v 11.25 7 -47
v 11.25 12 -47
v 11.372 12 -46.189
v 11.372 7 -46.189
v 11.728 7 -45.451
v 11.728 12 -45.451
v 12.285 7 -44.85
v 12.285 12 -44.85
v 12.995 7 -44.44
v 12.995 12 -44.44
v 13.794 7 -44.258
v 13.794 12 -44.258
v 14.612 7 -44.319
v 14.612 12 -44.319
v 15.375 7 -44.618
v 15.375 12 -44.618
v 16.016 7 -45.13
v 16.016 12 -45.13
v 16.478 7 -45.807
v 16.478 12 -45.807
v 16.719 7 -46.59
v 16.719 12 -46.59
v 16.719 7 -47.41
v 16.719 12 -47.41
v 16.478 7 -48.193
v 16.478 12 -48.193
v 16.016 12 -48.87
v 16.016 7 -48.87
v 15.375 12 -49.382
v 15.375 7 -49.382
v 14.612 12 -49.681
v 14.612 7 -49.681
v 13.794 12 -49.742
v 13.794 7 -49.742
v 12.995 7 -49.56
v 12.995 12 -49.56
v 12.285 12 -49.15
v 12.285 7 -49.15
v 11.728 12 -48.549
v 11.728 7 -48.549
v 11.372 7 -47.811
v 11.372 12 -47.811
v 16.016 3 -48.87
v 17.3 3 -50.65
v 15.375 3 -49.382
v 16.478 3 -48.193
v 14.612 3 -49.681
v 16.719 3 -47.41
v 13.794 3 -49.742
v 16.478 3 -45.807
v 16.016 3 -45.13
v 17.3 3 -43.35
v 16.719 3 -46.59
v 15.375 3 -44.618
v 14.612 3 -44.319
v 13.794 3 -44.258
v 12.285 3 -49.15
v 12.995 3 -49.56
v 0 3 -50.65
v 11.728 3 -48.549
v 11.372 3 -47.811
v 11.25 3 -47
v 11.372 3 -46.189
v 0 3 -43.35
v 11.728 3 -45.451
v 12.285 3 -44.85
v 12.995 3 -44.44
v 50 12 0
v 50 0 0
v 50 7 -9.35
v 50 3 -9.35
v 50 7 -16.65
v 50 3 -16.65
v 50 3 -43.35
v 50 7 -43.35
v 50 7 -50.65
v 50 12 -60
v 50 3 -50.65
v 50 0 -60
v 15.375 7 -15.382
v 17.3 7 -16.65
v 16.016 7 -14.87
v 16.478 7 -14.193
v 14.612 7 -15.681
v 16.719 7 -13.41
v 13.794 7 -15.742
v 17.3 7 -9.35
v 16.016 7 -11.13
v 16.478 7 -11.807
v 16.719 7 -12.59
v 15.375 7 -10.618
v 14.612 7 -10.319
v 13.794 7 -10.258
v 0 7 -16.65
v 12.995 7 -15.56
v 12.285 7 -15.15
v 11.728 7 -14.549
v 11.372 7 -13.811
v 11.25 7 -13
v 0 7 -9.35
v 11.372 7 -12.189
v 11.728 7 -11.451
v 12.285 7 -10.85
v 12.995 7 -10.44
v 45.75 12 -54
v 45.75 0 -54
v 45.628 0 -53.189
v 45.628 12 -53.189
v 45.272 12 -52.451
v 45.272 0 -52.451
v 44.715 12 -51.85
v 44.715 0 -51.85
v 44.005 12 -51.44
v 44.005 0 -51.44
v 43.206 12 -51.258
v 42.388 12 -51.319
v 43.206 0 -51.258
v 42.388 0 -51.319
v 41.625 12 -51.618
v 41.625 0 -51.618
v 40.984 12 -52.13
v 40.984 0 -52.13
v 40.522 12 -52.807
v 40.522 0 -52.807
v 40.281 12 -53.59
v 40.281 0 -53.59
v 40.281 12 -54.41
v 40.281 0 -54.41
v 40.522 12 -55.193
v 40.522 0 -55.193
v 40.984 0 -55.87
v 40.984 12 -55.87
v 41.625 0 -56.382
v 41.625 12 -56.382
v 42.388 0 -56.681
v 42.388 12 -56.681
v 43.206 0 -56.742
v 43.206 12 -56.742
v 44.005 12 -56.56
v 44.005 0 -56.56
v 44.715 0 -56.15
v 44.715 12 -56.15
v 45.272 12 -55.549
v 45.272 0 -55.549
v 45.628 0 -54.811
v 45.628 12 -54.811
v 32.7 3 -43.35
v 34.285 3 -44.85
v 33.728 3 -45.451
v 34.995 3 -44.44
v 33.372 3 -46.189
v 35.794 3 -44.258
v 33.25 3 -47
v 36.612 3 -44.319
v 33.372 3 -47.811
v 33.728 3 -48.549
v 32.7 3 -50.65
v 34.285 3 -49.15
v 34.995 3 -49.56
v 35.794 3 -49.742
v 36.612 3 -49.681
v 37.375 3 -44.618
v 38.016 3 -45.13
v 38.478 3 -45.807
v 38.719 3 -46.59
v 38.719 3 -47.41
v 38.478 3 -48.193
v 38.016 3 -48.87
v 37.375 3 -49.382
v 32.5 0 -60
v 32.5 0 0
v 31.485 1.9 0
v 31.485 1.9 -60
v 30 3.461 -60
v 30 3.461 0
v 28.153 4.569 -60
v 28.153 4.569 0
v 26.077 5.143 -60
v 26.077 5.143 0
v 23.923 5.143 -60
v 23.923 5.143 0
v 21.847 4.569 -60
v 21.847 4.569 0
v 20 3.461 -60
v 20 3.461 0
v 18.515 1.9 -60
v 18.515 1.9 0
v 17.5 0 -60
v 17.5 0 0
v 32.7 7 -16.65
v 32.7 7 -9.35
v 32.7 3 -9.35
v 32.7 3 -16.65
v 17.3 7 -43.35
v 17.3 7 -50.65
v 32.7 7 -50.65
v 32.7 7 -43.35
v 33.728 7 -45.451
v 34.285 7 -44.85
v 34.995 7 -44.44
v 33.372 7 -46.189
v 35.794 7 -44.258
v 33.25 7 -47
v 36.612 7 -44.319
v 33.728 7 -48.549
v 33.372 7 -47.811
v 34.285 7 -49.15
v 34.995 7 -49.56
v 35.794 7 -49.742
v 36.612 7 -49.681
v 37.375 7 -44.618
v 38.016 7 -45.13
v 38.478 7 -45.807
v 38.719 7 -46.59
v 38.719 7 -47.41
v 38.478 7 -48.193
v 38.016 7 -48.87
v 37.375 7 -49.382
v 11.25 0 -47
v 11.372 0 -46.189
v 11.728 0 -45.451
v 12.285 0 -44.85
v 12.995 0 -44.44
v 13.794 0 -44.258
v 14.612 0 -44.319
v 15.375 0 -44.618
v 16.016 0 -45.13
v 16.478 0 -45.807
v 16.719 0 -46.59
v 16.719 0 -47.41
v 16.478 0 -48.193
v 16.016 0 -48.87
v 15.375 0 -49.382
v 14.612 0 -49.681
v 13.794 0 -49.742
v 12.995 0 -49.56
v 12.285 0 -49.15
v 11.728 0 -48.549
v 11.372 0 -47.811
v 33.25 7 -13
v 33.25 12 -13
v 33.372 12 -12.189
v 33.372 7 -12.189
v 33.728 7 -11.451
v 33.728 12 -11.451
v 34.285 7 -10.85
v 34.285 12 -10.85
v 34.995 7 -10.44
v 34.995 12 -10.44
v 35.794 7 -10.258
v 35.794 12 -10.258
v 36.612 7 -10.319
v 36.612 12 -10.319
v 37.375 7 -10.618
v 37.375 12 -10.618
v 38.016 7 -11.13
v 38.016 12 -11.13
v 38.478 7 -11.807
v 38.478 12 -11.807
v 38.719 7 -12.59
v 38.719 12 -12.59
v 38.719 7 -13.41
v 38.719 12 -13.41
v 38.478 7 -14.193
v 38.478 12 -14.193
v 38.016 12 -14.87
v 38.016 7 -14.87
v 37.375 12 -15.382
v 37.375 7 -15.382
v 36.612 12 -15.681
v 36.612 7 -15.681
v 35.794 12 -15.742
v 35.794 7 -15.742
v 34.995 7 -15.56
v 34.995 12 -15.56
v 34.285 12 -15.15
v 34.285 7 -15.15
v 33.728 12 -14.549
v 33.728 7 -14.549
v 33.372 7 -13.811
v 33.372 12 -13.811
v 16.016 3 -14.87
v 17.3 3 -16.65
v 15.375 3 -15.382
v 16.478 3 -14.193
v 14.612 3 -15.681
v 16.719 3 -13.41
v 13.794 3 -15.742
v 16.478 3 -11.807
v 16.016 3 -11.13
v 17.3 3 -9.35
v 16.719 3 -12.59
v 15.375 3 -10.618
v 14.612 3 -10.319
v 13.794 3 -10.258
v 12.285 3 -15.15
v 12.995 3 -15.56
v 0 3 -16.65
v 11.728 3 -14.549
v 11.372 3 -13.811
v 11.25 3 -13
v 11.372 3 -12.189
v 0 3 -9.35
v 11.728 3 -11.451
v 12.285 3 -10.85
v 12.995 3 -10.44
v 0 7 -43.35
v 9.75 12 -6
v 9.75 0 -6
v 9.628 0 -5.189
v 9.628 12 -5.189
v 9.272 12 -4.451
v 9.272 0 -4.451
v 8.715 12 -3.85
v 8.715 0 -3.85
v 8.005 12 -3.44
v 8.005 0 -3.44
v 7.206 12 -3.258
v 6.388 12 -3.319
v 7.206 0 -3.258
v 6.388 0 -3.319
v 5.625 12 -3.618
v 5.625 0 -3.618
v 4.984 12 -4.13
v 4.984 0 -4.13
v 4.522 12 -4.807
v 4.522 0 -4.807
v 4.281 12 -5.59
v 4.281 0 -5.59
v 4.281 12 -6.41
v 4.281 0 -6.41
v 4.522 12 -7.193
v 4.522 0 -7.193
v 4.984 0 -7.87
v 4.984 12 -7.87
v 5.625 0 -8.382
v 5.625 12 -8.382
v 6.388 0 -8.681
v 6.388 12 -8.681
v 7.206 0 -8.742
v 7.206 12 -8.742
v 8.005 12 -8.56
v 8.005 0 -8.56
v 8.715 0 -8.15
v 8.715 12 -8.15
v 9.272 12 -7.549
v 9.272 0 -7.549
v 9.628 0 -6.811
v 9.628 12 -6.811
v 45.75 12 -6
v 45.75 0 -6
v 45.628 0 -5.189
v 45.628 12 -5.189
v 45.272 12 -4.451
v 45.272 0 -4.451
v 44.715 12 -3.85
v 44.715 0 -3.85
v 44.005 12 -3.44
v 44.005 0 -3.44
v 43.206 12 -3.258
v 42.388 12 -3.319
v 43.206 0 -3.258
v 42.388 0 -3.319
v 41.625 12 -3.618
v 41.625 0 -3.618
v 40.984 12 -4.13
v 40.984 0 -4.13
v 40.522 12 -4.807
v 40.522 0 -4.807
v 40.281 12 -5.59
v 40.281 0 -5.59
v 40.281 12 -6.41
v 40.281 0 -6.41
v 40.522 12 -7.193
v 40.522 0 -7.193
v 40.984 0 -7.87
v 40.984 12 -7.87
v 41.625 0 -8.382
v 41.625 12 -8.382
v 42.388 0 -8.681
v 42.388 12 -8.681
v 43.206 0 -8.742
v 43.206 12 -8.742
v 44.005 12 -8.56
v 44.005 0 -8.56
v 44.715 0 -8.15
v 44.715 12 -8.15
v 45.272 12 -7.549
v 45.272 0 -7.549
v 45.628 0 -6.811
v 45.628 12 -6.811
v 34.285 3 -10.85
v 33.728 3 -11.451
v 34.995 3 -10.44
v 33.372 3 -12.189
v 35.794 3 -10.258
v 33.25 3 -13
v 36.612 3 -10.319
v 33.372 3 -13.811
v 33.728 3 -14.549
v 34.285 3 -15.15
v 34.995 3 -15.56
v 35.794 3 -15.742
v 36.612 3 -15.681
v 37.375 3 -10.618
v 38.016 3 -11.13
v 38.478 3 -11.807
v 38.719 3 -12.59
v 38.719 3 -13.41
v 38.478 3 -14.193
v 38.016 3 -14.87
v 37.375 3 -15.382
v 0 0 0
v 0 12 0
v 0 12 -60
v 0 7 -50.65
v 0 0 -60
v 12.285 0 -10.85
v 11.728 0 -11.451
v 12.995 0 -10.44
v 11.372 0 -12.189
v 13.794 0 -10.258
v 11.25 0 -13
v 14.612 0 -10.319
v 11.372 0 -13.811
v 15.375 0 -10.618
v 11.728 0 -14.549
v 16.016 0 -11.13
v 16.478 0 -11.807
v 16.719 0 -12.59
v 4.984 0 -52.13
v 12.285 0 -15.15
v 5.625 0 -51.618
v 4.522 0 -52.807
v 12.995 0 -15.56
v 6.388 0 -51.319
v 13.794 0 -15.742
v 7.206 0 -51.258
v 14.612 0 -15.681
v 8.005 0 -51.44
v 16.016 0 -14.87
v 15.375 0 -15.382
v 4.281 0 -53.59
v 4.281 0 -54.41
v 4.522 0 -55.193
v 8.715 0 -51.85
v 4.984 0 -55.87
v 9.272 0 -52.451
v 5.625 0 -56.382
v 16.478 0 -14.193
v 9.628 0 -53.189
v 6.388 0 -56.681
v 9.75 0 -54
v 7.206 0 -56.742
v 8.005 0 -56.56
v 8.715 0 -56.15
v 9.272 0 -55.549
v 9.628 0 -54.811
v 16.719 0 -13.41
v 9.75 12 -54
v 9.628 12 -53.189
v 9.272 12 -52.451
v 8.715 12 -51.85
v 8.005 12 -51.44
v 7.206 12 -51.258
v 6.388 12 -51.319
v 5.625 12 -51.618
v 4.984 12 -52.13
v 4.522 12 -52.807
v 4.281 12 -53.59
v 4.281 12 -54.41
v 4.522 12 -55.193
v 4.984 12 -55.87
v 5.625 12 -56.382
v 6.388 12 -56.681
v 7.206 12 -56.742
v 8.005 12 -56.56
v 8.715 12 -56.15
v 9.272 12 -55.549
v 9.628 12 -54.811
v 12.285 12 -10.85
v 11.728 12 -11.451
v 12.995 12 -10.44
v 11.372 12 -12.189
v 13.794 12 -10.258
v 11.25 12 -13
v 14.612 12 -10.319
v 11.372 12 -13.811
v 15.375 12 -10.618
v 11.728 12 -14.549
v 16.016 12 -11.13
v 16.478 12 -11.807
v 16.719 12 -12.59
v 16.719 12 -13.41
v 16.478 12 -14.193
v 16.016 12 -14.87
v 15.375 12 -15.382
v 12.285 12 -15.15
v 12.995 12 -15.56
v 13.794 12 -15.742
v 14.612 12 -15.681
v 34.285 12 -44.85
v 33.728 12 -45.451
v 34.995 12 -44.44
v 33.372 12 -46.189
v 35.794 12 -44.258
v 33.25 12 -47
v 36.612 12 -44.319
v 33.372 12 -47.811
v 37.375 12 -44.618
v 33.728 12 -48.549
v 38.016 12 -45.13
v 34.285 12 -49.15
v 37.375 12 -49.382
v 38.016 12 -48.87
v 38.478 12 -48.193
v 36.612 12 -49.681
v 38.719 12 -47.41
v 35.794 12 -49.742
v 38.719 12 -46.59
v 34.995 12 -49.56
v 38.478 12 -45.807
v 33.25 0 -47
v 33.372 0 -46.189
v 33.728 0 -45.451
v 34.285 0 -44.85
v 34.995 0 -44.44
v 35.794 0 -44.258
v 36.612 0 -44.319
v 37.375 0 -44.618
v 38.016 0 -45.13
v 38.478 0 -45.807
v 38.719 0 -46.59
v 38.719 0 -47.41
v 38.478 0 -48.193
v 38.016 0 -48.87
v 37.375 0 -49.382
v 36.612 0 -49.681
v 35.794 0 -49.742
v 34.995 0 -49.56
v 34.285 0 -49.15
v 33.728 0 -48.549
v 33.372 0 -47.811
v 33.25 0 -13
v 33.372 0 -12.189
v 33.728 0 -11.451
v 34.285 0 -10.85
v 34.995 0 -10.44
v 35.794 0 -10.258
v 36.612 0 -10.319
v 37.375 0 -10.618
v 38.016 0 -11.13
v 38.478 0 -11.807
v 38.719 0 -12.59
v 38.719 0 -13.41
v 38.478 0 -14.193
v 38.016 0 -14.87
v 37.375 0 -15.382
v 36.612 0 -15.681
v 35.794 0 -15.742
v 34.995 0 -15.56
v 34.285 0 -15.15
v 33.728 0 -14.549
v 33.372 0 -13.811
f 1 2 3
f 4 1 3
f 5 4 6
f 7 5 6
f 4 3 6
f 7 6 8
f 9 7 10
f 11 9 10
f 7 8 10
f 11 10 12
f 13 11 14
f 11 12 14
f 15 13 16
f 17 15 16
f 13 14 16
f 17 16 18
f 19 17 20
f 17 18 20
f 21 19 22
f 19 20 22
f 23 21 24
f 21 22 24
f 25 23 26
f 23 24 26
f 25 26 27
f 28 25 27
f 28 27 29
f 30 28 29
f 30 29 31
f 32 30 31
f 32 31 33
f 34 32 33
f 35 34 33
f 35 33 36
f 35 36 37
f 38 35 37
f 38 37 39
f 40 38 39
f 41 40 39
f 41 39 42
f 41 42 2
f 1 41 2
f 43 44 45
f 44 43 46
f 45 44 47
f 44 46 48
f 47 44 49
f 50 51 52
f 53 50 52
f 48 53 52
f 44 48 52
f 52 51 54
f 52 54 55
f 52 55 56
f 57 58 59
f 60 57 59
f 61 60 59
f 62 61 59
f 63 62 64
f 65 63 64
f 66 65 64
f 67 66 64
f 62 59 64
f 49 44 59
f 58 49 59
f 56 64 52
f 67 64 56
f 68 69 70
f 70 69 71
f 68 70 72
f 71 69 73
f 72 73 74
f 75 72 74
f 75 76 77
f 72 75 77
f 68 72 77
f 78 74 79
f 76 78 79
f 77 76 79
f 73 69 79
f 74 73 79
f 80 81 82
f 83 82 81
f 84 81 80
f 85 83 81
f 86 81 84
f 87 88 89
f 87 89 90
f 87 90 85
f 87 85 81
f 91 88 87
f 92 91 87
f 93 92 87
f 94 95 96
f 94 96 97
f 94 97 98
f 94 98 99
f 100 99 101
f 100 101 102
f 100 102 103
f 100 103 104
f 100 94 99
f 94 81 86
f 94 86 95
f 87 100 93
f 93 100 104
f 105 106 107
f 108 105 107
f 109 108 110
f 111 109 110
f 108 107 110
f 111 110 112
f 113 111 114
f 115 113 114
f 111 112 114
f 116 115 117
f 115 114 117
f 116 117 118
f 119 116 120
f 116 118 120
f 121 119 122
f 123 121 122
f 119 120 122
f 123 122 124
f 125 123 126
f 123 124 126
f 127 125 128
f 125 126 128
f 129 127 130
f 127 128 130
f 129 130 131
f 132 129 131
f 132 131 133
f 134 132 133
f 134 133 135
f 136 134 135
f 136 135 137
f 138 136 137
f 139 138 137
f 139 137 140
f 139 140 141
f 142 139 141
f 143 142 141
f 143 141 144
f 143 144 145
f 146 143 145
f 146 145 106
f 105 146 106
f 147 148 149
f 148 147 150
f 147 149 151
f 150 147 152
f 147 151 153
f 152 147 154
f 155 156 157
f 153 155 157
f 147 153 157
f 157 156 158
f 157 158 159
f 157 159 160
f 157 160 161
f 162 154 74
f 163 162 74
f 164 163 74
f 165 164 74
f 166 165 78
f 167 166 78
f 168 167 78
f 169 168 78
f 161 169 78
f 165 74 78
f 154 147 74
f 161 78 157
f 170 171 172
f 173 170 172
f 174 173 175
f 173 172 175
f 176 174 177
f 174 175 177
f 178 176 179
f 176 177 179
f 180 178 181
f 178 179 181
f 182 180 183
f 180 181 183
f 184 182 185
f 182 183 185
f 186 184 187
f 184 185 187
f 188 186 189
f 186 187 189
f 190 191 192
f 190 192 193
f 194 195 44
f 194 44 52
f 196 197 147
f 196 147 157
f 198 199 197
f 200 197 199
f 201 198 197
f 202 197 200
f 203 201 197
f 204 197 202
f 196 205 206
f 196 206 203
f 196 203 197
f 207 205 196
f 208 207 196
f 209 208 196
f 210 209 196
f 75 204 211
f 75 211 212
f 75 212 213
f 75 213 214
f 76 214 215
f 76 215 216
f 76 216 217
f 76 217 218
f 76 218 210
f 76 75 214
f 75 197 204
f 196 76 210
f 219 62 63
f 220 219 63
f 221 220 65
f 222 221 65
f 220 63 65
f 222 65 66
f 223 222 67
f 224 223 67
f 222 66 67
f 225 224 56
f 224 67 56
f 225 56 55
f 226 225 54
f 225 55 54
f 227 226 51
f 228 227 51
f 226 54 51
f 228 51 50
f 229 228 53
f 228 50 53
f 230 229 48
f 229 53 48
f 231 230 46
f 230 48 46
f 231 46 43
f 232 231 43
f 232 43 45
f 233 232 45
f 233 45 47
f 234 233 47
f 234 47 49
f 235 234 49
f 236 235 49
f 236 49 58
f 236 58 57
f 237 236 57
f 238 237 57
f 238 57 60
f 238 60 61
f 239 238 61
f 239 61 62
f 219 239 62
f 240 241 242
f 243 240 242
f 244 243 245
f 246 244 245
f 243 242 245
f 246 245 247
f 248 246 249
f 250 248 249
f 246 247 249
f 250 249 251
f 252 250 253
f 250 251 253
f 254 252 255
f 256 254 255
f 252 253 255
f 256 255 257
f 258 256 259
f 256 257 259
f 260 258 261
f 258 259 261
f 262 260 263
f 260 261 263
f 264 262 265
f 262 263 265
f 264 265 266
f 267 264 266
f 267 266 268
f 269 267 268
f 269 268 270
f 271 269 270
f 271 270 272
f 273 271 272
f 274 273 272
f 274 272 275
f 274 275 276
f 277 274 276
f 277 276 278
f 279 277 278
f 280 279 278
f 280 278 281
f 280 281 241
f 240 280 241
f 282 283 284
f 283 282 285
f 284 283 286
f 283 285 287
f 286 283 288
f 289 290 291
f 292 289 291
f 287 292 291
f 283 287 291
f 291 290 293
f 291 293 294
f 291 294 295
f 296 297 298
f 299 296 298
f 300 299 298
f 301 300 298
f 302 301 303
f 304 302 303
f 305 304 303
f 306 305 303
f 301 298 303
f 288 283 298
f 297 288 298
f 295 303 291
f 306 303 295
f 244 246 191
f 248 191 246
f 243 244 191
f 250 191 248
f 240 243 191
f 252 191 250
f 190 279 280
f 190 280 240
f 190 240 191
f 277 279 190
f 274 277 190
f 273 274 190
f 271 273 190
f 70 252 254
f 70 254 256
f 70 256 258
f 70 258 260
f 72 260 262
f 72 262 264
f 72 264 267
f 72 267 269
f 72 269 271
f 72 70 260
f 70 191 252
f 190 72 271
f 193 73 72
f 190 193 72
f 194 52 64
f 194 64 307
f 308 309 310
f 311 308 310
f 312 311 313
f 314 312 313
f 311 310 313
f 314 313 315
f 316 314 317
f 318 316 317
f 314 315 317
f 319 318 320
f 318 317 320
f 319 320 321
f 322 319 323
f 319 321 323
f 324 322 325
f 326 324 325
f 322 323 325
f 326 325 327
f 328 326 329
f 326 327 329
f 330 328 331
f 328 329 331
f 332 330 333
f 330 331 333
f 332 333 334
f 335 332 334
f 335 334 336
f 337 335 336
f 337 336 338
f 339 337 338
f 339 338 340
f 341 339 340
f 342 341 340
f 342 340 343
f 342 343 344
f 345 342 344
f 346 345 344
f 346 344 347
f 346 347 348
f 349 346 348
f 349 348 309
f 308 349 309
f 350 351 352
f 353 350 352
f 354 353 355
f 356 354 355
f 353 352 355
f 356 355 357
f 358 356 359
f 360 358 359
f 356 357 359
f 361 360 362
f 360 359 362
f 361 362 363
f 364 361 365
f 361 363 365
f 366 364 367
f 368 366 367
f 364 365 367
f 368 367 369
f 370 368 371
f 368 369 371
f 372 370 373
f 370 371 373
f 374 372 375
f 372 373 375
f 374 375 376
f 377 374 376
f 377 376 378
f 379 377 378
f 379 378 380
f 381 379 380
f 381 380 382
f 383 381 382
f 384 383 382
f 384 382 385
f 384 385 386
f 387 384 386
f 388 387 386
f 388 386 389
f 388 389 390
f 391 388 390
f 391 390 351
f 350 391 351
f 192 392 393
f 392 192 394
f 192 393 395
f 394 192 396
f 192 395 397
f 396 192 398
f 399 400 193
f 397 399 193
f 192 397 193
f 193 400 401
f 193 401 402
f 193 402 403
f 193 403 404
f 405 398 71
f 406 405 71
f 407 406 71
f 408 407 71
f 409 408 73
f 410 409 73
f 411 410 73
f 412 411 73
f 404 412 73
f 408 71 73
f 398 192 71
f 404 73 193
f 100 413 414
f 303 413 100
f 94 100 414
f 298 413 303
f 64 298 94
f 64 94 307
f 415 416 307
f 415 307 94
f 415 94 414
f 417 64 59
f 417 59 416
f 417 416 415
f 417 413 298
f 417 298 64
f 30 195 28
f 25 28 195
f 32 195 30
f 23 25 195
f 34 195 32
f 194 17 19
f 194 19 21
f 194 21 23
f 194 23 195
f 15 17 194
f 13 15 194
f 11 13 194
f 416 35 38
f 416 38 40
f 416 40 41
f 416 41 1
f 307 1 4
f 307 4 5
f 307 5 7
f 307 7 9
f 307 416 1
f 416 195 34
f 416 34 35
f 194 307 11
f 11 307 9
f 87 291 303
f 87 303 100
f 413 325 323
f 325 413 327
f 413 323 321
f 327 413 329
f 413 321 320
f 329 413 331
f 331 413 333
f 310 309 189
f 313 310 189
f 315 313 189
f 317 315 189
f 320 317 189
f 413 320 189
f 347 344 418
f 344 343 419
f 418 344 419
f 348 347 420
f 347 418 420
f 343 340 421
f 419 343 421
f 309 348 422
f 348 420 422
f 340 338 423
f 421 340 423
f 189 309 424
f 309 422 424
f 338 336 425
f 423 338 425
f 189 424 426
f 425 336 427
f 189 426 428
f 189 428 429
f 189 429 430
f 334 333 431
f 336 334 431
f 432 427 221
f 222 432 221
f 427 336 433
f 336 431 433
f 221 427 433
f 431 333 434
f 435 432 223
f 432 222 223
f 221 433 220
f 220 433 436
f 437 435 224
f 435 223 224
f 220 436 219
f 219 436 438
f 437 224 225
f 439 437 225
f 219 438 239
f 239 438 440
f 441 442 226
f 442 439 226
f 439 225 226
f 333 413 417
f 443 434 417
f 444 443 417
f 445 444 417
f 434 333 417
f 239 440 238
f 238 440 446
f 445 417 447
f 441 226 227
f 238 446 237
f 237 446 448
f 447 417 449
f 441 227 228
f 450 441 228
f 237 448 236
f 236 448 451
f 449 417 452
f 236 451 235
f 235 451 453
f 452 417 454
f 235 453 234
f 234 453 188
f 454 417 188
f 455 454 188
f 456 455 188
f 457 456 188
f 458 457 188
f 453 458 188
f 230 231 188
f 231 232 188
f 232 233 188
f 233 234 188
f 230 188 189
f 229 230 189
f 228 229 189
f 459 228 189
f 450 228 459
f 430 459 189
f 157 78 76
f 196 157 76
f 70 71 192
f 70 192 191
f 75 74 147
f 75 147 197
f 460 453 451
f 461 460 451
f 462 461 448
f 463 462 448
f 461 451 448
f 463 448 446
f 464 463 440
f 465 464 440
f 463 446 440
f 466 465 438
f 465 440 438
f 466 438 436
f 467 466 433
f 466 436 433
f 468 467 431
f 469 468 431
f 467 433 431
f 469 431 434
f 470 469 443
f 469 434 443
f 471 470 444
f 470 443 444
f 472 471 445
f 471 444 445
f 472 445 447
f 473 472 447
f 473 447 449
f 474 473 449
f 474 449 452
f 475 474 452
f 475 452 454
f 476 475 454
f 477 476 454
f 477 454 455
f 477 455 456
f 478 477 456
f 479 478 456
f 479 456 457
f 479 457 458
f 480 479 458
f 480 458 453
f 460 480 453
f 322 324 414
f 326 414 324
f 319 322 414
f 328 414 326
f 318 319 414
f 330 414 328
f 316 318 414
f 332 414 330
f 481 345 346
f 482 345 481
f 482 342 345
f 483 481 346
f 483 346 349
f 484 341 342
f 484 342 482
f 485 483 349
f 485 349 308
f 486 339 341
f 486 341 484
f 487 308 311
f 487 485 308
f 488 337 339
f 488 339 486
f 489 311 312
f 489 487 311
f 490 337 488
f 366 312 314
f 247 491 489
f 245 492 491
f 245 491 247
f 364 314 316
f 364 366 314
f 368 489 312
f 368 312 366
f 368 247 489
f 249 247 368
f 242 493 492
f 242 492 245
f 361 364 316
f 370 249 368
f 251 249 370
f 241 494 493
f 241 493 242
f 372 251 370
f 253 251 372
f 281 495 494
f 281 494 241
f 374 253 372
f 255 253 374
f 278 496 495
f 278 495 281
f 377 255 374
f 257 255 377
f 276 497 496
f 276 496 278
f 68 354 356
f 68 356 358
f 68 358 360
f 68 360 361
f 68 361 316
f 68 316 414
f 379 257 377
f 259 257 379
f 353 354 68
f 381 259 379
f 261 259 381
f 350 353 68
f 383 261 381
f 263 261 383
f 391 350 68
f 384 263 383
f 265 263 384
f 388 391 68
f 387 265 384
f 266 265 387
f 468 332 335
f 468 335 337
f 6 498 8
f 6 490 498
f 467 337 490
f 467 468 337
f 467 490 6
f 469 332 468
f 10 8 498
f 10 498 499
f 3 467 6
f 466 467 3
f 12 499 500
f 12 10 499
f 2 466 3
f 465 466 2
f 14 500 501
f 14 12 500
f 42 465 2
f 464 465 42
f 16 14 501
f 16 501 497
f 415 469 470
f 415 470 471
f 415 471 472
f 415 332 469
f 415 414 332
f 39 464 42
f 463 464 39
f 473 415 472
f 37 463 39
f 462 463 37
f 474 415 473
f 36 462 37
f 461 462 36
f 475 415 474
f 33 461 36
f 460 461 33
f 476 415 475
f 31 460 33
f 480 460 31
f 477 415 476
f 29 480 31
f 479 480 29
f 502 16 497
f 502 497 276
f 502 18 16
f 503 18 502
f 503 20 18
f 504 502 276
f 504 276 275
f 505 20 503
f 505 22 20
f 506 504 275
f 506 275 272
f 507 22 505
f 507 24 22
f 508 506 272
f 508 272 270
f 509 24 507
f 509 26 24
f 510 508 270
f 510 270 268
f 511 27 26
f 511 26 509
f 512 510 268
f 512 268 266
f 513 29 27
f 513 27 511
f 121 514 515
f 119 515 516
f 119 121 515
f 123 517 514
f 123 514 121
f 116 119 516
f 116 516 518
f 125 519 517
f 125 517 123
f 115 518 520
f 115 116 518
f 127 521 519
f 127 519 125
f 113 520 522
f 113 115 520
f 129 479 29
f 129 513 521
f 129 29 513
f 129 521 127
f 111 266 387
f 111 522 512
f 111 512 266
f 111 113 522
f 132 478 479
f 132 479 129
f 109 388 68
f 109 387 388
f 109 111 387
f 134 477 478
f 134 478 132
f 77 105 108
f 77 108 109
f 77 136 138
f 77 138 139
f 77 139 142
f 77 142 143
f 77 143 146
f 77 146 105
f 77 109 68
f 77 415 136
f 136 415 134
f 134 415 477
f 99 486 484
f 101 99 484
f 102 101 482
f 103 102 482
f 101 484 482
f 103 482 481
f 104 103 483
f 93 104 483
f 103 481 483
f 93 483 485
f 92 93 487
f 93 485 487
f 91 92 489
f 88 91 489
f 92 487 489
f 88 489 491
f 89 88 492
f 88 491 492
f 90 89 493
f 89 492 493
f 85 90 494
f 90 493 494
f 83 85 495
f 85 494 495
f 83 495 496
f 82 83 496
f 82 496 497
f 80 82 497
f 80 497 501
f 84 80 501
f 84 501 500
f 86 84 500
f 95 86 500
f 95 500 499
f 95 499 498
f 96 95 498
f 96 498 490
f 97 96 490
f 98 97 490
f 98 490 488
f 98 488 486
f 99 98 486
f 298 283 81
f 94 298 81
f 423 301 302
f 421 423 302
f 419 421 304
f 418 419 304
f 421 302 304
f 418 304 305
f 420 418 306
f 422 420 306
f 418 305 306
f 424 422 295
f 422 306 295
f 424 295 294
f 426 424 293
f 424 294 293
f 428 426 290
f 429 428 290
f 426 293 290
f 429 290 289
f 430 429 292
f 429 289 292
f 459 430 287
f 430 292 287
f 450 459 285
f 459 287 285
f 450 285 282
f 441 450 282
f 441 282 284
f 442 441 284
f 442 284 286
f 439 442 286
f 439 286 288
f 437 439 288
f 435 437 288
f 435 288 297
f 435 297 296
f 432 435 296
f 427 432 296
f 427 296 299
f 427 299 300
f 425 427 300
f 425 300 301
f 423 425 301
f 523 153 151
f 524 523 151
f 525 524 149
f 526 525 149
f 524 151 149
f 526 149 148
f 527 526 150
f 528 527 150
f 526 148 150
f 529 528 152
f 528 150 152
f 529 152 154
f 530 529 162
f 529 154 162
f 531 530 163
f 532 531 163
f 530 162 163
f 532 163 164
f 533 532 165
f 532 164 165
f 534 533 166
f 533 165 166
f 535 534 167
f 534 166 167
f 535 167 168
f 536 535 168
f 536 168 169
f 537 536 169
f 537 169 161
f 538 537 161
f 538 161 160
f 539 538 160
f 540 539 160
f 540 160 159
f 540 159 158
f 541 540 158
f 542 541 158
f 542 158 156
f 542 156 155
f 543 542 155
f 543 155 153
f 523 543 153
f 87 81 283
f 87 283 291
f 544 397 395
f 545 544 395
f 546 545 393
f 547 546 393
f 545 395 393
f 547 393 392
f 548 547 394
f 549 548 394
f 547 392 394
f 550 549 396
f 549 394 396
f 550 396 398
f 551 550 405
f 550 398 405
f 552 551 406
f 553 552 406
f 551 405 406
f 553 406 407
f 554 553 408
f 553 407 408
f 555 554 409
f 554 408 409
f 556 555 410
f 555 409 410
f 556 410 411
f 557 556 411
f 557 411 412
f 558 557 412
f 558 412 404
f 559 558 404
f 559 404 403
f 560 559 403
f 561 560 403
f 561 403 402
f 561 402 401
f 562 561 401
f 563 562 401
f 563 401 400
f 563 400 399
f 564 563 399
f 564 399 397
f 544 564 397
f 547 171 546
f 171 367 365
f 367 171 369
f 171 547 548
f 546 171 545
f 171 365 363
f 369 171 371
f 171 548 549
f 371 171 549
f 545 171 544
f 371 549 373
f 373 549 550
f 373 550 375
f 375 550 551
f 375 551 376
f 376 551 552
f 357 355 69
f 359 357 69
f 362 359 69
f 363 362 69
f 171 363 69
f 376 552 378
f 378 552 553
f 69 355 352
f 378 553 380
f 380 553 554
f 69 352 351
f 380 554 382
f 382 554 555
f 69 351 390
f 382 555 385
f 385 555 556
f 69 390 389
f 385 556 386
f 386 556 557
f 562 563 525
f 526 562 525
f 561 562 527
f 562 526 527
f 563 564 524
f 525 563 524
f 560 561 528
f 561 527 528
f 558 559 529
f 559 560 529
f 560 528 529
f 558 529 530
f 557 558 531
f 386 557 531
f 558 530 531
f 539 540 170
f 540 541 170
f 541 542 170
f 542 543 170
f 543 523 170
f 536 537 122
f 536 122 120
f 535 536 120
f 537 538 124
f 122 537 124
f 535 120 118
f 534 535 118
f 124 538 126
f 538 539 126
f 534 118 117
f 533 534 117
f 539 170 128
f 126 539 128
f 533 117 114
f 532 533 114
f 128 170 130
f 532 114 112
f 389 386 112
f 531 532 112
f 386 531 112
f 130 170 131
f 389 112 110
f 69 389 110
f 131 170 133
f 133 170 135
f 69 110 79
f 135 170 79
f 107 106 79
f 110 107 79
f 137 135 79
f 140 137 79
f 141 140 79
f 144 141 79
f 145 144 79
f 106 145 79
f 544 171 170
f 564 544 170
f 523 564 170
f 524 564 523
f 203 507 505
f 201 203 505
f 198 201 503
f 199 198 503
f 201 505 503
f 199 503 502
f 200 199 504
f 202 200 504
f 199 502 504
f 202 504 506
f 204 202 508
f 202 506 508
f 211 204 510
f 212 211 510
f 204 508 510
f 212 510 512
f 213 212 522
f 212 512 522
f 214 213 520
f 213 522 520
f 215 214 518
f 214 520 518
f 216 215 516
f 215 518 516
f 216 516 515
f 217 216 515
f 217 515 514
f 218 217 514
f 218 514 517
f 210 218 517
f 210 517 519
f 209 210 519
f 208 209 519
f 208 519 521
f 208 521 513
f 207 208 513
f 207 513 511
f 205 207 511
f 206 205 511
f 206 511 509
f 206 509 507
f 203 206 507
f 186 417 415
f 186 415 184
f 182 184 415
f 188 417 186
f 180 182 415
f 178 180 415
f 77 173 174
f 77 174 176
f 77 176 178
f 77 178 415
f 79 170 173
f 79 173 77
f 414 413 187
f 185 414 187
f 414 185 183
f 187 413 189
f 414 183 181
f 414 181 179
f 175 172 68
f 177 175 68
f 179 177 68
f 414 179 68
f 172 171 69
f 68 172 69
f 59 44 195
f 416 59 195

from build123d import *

# Parameters (mm, degrees)
SKETCH1_W                      = 50
SKETCH1_H                      = 60
BOSS_EXTRUDE1_DEPTH            = 12
CUT_EXTRUDE1_DEPTH             = 80.018985061
F_5_5_5_5_DIAMETER_HOLE1_D     = 5.5
F_5_5_5_5_DIAMETER_HOLE1_DEPTH = 30
F_5_5_5_5_DIAMETER_HOLE1_TIP   = 1.652366702
SKETCH5_W                      = 7.3
SKETCH5_H                      = 4
CUT_EXTRUDE2_DEPTH             = 17.3
SKETCH6_W                      = 7.3
SKETCH6_H                      = 4
CUT_EXTRUDE3_DEPTH             = 17.3
F_5_5_5_5_DIAMETER_HOLE2_D     = 5.5


with BuildPart() as part:
    # Sketch1 → Boss-Extrude1 (new body)
    with BuildSketch(Plane(origin=(0, 0, 0), x_dir=(1, 0, 0), z_dir=(0, 1, 0))):
        with Locations((25, 30)):
            Rectangle(SKETCH1_W, SKETCH1_H)
    extrude(amount=BOSS_EXTRUDE1_DEPTH)

    # Sketch2 → Cut-Extrude1 (cut, through all)
    with BuildSketch(Plane.XY):
        with BuildLine():
            Line((17.5, 0), (32.5, 0))
            ThreePointArc((32.5, 0), (25, 5.216117819), (17.5, 0))
        make_face()
    extrude(amount=-CUT_EXTRUDE1_DEPTH, mode=Mode.SUBTRACT)

    # Ø5.5 (5.5) Diameter Hole1
    with Locations(Plane.XZ):
        with Locations((14, -13), (36, -13), (14, -47), (36, -47)):
            Hole(F_5_5_5_5_DIAMETER_HOLE1_D / 2, depth=F_5_5_5_5_DIAMETER_HOLE1_DEPTH)
            with Locations((0, 0, -(F_5_5_5_5_DIAMETER_HOLE1_DEPTH + F_5_5_5_5_DIAMETER_HOLE1_TIP / 2))):  # 118° drill point
                Cone(0, F_5_5_5_5_DIAMETER_HOLE1_D / 2, F_5_5_5_5_DIAMETER_HOLE1_TIP, mode=Mode.SUBTRACT)

    # Sketch5 → Cut-Extrude2 (cut)
    with BuildSketch(Plane.ZY):
        with Locations((-47, 5)):
            Rectangle(SKETCH5_W, SKETCH5_H)
        with Locations((-13, 5)):
            Rectangle(SKETCH5_W, SKETCH5_H)
    extrude(amount=-CUT_EXTRUDE2_DEPTH, mode=Mode.SUBTRACT)

    # Sketch6 → Cut-Extrude3 (cut)
    with BuildSketch(Plane(origin=(50, 0, 0), x_dir=(0, 0, -1), z_dir=(1, 0, 0))):
        with Locations((13, 5)):
            Rectangle(SKETCH6_W, SKETCH6_H)
        with Locations((47, 5)):
            Rectangle(SKETCH6_W, SKETCH6_H)
    extrude(amount=-CUT_EXTRUDE3_DEPTH, mode=Mode.SUBTRACT)

    # Ø5.5 (5.5) Diameter Hole2 (through all)
    with Locations(Plane(origin=(0, 12, 0), x_dir=(-1, 0, 0), z_dir=(0, 1, 0))):
        with Locations((-43, -6), (-7, -6), (-7, -54), (-43, -54)):
            Hole(F_5_5_5_5_DIAMETER_HOLE2_D / 2)


solid = part.part
